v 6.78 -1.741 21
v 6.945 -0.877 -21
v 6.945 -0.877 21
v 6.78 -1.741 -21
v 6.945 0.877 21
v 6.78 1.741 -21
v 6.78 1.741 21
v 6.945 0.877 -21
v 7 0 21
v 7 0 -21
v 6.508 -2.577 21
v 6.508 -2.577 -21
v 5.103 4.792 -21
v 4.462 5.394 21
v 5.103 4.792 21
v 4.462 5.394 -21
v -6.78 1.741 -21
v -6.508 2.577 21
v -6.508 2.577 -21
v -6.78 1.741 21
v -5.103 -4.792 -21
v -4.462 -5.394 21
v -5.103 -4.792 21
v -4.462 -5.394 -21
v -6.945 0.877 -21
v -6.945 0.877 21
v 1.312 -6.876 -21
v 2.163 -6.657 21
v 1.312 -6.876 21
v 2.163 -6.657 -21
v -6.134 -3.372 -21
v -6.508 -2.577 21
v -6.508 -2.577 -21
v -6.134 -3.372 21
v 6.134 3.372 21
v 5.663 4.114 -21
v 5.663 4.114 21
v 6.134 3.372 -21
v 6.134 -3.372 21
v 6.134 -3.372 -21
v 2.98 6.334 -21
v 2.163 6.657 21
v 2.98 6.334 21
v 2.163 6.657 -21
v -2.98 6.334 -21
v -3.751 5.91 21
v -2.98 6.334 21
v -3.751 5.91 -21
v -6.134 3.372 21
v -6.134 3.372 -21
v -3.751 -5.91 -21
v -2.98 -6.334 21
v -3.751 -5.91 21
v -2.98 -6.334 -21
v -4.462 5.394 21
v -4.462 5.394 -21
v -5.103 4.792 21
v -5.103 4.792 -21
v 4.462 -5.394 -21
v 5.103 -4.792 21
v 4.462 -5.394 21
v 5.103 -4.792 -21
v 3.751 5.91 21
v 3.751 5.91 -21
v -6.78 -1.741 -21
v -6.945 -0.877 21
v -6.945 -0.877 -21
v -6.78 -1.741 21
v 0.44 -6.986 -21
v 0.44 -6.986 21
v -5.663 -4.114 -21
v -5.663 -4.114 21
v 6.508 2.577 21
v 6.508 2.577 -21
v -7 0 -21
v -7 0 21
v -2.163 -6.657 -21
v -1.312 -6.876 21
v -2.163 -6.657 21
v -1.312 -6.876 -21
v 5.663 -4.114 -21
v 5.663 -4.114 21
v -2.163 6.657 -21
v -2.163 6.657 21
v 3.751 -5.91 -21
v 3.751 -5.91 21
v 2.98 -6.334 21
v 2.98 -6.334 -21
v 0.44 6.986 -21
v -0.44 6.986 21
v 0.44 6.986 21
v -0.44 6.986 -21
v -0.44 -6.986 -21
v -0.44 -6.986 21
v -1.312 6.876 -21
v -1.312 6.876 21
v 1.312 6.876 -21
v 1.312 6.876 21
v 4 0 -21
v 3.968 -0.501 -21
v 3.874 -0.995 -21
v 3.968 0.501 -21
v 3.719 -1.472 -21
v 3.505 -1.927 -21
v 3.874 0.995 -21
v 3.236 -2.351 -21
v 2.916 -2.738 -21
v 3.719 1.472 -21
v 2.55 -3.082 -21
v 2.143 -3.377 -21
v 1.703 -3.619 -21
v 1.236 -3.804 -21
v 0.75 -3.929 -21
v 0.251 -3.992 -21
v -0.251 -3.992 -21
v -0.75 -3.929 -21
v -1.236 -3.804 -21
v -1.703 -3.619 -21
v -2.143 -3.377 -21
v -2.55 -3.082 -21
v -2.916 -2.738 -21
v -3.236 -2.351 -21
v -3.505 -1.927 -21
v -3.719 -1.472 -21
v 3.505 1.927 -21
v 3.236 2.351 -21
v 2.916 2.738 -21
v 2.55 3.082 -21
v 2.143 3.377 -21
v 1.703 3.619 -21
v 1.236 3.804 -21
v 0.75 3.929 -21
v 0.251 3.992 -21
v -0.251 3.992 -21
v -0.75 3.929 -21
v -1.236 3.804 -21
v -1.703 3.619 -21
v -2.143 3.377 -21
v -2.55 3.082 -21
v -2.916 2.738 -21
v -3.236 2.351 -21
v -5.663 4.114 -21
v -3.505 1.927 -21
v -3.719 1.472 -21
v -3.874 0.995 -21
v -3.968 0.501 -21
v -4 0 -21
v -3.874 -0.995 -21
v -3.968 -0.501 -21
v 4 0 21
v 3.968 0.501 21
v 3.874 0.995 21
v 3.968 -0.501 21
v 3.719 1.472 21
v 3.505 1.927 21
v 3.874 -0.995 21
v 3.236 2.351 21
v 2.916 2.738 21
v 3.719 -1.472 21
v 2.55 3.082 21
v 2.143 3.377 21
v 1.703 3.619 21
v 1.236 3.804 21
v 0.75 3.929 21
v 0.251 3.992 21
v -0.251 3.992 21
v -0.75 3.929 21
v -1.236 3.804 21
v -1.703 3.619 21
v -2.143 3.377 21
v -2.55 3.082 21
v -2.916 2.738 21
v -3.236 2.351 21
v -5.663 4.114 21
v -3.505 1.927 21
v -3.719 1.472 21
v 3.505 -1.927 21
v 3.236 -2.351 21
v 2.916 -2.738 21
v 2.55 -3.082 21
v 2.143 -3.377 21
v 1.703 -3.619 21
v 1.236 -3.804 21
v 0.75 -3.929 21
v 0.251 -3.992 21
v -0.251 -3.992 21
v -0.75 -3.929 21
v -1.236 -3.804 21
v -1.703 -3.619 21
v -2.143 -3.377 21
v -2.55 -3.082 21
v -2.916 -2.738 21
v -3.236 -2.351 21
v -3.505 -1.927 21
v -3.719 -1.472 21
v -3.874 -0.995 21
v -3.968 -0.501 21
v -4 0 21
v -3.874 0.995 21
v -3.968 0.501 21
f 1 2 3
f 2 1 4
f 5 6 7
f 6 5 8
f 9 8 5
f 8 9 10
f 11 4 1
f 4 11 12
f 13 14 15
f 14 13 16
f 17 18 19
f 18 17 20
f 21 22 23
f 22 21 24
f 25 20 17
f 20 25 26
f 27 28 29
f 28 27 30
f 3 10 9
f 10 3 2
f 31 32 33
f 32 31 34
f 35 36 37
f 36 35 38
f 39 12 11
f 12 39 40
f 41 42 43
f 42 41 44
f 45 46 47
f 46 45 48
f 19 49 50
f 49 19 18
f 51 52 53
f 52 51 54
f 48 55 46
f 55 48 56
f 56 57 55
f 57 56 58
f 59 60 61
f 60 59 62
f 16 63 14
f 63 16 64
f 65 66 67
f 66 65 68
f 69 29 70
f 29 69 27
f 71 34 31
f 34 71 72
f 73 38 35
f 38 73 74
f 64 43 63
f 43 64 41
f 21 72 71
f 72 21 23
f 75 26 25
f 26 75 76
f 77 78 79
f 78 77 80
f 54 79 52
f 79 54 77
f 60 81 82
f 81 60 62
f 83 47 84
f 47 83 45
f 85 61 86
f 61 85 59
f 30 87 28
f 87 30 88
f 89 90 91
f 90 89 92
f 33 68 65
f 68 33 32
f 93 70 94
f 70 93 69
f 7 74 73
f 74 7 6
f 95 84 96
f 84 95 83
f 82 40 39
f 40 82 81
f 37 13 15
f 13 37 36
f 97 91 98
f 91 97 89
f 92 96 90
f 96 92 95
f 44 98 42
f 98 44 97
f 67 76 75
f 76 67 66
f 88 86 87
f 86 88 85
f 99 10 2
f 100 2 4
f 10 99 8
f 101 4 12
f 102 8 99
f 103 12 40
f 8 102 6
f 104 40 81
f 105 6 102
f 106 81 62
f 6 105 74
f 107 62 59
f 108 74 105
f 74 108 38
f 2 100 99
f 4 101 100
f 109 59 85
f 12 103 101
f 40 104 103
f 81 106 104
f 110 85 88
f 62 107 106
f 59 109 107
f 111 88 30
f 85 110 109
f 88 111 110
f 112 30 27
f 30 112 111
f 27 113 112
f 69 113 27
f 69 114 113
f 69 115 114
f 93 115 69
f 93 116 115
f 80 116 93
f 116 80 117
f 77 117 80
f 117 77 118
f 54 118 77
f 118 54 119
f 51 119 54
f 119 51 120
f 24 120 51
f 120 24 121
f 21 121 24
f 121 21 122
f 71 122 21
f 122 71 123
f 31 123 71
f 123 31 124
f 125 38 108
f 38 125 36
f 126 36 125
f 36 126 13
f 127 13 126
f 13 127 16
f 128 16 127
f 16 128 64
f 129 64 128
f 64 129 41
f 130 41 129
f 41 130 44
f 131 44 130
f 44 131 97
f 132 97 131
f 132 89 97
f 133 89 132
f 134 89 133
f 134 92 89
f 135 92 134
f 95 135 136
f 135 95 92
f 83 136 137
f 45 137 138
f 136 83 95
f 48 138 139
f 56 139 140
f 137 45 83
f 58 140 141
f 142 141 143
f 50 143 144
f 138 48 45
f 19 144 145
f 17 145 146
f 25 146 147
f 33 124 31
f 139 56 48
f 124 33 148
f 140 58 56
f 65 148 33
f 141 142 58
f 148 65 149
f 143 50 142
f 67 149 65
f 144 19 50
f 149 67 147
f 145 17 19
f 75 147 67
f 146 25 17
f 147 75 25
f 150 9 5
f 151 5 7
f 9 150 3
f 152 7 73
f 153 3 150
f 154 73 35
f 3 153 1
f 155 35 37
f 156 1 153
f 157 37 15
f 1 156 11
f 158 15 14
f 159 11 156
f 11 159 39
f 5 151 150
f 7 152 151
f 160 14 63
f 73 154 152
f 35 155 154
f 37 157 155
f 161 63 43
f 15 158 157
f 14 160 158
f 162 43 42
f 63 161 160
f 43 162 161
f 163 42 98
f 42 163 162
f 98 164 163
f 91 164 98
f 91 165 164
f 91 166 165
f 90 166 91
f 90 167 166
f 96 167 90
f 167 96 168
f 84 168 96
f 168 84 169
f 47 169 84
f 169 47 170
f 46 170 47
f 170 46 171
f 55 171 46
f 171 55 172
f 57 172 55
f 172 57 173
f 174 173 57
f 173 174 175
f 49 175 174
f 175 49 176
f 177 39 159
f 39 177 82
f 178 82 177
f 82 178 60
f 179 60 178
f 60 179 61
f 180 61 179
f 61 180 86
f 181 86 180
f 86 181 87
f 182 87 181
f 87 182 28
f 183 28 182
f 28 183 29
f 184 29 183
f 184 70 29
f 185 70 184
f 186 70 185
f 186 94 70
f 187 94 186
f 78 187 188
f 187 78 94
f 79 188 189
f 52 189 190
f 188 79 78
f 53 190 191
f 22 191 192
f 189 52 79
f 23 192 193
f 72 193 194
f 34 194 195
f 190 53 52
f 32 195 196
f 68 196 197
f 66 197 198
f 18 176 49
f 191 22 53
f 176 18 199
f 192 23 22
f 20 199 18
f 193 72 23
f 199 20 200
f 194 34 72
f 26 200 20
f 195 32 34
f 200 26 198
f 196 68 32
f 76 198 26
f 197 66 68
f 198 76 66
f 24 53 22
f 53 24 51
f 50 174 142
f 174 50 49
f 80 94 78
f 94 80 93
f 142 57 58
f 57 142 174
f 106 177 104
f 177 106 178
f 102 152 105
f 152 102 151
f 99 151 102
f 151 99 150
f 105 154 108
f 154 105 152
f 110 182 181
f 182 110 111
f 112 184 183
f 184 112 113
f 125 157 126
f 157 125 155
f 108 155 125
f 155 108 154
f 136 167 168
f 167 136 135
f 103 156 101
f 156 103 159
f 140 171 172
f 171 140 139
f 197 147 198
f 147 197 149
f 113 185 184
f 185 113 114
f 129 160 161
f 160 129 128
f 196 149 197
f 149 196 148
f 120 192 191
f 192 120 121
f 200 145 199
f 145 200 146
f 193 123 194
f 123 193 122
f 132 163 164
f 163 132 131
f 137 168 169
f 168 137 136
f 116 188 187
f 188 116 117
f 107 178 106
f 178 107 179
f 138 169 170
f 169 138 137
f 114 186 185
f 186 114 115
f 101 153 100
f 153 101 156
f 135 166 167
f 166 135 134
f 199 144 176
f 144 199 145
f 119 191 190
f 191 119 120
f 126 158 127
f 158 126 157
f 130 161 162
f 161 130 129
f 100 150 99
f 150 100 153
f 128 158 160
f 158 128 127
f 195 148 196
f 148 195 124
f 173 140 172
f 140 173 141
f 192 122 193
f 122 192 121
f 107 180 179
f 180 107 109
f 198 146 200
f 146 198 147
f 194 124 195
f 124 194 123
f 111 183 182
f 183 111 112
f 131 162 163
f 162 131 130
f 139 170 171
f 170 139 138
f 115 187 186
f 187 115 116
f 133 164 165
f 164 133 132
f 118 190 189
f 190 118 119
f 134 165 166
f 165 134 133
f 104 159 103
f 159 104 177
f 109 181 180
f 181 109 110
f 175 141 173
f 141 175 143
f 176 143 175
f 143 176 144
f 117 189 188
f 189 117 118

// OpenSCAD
$fn = 50;


difference() {
	union() {
		translate(v = [0, 0, -21.0000000000]) {
			cylinder(h = 42, r = 7.0000000000);
		}
	}
	union() {
		translate(v = [0, 0, -100.0000000000]) {
			cylinder(h = 200, r = 4.0000000000);
		}
	}
}
